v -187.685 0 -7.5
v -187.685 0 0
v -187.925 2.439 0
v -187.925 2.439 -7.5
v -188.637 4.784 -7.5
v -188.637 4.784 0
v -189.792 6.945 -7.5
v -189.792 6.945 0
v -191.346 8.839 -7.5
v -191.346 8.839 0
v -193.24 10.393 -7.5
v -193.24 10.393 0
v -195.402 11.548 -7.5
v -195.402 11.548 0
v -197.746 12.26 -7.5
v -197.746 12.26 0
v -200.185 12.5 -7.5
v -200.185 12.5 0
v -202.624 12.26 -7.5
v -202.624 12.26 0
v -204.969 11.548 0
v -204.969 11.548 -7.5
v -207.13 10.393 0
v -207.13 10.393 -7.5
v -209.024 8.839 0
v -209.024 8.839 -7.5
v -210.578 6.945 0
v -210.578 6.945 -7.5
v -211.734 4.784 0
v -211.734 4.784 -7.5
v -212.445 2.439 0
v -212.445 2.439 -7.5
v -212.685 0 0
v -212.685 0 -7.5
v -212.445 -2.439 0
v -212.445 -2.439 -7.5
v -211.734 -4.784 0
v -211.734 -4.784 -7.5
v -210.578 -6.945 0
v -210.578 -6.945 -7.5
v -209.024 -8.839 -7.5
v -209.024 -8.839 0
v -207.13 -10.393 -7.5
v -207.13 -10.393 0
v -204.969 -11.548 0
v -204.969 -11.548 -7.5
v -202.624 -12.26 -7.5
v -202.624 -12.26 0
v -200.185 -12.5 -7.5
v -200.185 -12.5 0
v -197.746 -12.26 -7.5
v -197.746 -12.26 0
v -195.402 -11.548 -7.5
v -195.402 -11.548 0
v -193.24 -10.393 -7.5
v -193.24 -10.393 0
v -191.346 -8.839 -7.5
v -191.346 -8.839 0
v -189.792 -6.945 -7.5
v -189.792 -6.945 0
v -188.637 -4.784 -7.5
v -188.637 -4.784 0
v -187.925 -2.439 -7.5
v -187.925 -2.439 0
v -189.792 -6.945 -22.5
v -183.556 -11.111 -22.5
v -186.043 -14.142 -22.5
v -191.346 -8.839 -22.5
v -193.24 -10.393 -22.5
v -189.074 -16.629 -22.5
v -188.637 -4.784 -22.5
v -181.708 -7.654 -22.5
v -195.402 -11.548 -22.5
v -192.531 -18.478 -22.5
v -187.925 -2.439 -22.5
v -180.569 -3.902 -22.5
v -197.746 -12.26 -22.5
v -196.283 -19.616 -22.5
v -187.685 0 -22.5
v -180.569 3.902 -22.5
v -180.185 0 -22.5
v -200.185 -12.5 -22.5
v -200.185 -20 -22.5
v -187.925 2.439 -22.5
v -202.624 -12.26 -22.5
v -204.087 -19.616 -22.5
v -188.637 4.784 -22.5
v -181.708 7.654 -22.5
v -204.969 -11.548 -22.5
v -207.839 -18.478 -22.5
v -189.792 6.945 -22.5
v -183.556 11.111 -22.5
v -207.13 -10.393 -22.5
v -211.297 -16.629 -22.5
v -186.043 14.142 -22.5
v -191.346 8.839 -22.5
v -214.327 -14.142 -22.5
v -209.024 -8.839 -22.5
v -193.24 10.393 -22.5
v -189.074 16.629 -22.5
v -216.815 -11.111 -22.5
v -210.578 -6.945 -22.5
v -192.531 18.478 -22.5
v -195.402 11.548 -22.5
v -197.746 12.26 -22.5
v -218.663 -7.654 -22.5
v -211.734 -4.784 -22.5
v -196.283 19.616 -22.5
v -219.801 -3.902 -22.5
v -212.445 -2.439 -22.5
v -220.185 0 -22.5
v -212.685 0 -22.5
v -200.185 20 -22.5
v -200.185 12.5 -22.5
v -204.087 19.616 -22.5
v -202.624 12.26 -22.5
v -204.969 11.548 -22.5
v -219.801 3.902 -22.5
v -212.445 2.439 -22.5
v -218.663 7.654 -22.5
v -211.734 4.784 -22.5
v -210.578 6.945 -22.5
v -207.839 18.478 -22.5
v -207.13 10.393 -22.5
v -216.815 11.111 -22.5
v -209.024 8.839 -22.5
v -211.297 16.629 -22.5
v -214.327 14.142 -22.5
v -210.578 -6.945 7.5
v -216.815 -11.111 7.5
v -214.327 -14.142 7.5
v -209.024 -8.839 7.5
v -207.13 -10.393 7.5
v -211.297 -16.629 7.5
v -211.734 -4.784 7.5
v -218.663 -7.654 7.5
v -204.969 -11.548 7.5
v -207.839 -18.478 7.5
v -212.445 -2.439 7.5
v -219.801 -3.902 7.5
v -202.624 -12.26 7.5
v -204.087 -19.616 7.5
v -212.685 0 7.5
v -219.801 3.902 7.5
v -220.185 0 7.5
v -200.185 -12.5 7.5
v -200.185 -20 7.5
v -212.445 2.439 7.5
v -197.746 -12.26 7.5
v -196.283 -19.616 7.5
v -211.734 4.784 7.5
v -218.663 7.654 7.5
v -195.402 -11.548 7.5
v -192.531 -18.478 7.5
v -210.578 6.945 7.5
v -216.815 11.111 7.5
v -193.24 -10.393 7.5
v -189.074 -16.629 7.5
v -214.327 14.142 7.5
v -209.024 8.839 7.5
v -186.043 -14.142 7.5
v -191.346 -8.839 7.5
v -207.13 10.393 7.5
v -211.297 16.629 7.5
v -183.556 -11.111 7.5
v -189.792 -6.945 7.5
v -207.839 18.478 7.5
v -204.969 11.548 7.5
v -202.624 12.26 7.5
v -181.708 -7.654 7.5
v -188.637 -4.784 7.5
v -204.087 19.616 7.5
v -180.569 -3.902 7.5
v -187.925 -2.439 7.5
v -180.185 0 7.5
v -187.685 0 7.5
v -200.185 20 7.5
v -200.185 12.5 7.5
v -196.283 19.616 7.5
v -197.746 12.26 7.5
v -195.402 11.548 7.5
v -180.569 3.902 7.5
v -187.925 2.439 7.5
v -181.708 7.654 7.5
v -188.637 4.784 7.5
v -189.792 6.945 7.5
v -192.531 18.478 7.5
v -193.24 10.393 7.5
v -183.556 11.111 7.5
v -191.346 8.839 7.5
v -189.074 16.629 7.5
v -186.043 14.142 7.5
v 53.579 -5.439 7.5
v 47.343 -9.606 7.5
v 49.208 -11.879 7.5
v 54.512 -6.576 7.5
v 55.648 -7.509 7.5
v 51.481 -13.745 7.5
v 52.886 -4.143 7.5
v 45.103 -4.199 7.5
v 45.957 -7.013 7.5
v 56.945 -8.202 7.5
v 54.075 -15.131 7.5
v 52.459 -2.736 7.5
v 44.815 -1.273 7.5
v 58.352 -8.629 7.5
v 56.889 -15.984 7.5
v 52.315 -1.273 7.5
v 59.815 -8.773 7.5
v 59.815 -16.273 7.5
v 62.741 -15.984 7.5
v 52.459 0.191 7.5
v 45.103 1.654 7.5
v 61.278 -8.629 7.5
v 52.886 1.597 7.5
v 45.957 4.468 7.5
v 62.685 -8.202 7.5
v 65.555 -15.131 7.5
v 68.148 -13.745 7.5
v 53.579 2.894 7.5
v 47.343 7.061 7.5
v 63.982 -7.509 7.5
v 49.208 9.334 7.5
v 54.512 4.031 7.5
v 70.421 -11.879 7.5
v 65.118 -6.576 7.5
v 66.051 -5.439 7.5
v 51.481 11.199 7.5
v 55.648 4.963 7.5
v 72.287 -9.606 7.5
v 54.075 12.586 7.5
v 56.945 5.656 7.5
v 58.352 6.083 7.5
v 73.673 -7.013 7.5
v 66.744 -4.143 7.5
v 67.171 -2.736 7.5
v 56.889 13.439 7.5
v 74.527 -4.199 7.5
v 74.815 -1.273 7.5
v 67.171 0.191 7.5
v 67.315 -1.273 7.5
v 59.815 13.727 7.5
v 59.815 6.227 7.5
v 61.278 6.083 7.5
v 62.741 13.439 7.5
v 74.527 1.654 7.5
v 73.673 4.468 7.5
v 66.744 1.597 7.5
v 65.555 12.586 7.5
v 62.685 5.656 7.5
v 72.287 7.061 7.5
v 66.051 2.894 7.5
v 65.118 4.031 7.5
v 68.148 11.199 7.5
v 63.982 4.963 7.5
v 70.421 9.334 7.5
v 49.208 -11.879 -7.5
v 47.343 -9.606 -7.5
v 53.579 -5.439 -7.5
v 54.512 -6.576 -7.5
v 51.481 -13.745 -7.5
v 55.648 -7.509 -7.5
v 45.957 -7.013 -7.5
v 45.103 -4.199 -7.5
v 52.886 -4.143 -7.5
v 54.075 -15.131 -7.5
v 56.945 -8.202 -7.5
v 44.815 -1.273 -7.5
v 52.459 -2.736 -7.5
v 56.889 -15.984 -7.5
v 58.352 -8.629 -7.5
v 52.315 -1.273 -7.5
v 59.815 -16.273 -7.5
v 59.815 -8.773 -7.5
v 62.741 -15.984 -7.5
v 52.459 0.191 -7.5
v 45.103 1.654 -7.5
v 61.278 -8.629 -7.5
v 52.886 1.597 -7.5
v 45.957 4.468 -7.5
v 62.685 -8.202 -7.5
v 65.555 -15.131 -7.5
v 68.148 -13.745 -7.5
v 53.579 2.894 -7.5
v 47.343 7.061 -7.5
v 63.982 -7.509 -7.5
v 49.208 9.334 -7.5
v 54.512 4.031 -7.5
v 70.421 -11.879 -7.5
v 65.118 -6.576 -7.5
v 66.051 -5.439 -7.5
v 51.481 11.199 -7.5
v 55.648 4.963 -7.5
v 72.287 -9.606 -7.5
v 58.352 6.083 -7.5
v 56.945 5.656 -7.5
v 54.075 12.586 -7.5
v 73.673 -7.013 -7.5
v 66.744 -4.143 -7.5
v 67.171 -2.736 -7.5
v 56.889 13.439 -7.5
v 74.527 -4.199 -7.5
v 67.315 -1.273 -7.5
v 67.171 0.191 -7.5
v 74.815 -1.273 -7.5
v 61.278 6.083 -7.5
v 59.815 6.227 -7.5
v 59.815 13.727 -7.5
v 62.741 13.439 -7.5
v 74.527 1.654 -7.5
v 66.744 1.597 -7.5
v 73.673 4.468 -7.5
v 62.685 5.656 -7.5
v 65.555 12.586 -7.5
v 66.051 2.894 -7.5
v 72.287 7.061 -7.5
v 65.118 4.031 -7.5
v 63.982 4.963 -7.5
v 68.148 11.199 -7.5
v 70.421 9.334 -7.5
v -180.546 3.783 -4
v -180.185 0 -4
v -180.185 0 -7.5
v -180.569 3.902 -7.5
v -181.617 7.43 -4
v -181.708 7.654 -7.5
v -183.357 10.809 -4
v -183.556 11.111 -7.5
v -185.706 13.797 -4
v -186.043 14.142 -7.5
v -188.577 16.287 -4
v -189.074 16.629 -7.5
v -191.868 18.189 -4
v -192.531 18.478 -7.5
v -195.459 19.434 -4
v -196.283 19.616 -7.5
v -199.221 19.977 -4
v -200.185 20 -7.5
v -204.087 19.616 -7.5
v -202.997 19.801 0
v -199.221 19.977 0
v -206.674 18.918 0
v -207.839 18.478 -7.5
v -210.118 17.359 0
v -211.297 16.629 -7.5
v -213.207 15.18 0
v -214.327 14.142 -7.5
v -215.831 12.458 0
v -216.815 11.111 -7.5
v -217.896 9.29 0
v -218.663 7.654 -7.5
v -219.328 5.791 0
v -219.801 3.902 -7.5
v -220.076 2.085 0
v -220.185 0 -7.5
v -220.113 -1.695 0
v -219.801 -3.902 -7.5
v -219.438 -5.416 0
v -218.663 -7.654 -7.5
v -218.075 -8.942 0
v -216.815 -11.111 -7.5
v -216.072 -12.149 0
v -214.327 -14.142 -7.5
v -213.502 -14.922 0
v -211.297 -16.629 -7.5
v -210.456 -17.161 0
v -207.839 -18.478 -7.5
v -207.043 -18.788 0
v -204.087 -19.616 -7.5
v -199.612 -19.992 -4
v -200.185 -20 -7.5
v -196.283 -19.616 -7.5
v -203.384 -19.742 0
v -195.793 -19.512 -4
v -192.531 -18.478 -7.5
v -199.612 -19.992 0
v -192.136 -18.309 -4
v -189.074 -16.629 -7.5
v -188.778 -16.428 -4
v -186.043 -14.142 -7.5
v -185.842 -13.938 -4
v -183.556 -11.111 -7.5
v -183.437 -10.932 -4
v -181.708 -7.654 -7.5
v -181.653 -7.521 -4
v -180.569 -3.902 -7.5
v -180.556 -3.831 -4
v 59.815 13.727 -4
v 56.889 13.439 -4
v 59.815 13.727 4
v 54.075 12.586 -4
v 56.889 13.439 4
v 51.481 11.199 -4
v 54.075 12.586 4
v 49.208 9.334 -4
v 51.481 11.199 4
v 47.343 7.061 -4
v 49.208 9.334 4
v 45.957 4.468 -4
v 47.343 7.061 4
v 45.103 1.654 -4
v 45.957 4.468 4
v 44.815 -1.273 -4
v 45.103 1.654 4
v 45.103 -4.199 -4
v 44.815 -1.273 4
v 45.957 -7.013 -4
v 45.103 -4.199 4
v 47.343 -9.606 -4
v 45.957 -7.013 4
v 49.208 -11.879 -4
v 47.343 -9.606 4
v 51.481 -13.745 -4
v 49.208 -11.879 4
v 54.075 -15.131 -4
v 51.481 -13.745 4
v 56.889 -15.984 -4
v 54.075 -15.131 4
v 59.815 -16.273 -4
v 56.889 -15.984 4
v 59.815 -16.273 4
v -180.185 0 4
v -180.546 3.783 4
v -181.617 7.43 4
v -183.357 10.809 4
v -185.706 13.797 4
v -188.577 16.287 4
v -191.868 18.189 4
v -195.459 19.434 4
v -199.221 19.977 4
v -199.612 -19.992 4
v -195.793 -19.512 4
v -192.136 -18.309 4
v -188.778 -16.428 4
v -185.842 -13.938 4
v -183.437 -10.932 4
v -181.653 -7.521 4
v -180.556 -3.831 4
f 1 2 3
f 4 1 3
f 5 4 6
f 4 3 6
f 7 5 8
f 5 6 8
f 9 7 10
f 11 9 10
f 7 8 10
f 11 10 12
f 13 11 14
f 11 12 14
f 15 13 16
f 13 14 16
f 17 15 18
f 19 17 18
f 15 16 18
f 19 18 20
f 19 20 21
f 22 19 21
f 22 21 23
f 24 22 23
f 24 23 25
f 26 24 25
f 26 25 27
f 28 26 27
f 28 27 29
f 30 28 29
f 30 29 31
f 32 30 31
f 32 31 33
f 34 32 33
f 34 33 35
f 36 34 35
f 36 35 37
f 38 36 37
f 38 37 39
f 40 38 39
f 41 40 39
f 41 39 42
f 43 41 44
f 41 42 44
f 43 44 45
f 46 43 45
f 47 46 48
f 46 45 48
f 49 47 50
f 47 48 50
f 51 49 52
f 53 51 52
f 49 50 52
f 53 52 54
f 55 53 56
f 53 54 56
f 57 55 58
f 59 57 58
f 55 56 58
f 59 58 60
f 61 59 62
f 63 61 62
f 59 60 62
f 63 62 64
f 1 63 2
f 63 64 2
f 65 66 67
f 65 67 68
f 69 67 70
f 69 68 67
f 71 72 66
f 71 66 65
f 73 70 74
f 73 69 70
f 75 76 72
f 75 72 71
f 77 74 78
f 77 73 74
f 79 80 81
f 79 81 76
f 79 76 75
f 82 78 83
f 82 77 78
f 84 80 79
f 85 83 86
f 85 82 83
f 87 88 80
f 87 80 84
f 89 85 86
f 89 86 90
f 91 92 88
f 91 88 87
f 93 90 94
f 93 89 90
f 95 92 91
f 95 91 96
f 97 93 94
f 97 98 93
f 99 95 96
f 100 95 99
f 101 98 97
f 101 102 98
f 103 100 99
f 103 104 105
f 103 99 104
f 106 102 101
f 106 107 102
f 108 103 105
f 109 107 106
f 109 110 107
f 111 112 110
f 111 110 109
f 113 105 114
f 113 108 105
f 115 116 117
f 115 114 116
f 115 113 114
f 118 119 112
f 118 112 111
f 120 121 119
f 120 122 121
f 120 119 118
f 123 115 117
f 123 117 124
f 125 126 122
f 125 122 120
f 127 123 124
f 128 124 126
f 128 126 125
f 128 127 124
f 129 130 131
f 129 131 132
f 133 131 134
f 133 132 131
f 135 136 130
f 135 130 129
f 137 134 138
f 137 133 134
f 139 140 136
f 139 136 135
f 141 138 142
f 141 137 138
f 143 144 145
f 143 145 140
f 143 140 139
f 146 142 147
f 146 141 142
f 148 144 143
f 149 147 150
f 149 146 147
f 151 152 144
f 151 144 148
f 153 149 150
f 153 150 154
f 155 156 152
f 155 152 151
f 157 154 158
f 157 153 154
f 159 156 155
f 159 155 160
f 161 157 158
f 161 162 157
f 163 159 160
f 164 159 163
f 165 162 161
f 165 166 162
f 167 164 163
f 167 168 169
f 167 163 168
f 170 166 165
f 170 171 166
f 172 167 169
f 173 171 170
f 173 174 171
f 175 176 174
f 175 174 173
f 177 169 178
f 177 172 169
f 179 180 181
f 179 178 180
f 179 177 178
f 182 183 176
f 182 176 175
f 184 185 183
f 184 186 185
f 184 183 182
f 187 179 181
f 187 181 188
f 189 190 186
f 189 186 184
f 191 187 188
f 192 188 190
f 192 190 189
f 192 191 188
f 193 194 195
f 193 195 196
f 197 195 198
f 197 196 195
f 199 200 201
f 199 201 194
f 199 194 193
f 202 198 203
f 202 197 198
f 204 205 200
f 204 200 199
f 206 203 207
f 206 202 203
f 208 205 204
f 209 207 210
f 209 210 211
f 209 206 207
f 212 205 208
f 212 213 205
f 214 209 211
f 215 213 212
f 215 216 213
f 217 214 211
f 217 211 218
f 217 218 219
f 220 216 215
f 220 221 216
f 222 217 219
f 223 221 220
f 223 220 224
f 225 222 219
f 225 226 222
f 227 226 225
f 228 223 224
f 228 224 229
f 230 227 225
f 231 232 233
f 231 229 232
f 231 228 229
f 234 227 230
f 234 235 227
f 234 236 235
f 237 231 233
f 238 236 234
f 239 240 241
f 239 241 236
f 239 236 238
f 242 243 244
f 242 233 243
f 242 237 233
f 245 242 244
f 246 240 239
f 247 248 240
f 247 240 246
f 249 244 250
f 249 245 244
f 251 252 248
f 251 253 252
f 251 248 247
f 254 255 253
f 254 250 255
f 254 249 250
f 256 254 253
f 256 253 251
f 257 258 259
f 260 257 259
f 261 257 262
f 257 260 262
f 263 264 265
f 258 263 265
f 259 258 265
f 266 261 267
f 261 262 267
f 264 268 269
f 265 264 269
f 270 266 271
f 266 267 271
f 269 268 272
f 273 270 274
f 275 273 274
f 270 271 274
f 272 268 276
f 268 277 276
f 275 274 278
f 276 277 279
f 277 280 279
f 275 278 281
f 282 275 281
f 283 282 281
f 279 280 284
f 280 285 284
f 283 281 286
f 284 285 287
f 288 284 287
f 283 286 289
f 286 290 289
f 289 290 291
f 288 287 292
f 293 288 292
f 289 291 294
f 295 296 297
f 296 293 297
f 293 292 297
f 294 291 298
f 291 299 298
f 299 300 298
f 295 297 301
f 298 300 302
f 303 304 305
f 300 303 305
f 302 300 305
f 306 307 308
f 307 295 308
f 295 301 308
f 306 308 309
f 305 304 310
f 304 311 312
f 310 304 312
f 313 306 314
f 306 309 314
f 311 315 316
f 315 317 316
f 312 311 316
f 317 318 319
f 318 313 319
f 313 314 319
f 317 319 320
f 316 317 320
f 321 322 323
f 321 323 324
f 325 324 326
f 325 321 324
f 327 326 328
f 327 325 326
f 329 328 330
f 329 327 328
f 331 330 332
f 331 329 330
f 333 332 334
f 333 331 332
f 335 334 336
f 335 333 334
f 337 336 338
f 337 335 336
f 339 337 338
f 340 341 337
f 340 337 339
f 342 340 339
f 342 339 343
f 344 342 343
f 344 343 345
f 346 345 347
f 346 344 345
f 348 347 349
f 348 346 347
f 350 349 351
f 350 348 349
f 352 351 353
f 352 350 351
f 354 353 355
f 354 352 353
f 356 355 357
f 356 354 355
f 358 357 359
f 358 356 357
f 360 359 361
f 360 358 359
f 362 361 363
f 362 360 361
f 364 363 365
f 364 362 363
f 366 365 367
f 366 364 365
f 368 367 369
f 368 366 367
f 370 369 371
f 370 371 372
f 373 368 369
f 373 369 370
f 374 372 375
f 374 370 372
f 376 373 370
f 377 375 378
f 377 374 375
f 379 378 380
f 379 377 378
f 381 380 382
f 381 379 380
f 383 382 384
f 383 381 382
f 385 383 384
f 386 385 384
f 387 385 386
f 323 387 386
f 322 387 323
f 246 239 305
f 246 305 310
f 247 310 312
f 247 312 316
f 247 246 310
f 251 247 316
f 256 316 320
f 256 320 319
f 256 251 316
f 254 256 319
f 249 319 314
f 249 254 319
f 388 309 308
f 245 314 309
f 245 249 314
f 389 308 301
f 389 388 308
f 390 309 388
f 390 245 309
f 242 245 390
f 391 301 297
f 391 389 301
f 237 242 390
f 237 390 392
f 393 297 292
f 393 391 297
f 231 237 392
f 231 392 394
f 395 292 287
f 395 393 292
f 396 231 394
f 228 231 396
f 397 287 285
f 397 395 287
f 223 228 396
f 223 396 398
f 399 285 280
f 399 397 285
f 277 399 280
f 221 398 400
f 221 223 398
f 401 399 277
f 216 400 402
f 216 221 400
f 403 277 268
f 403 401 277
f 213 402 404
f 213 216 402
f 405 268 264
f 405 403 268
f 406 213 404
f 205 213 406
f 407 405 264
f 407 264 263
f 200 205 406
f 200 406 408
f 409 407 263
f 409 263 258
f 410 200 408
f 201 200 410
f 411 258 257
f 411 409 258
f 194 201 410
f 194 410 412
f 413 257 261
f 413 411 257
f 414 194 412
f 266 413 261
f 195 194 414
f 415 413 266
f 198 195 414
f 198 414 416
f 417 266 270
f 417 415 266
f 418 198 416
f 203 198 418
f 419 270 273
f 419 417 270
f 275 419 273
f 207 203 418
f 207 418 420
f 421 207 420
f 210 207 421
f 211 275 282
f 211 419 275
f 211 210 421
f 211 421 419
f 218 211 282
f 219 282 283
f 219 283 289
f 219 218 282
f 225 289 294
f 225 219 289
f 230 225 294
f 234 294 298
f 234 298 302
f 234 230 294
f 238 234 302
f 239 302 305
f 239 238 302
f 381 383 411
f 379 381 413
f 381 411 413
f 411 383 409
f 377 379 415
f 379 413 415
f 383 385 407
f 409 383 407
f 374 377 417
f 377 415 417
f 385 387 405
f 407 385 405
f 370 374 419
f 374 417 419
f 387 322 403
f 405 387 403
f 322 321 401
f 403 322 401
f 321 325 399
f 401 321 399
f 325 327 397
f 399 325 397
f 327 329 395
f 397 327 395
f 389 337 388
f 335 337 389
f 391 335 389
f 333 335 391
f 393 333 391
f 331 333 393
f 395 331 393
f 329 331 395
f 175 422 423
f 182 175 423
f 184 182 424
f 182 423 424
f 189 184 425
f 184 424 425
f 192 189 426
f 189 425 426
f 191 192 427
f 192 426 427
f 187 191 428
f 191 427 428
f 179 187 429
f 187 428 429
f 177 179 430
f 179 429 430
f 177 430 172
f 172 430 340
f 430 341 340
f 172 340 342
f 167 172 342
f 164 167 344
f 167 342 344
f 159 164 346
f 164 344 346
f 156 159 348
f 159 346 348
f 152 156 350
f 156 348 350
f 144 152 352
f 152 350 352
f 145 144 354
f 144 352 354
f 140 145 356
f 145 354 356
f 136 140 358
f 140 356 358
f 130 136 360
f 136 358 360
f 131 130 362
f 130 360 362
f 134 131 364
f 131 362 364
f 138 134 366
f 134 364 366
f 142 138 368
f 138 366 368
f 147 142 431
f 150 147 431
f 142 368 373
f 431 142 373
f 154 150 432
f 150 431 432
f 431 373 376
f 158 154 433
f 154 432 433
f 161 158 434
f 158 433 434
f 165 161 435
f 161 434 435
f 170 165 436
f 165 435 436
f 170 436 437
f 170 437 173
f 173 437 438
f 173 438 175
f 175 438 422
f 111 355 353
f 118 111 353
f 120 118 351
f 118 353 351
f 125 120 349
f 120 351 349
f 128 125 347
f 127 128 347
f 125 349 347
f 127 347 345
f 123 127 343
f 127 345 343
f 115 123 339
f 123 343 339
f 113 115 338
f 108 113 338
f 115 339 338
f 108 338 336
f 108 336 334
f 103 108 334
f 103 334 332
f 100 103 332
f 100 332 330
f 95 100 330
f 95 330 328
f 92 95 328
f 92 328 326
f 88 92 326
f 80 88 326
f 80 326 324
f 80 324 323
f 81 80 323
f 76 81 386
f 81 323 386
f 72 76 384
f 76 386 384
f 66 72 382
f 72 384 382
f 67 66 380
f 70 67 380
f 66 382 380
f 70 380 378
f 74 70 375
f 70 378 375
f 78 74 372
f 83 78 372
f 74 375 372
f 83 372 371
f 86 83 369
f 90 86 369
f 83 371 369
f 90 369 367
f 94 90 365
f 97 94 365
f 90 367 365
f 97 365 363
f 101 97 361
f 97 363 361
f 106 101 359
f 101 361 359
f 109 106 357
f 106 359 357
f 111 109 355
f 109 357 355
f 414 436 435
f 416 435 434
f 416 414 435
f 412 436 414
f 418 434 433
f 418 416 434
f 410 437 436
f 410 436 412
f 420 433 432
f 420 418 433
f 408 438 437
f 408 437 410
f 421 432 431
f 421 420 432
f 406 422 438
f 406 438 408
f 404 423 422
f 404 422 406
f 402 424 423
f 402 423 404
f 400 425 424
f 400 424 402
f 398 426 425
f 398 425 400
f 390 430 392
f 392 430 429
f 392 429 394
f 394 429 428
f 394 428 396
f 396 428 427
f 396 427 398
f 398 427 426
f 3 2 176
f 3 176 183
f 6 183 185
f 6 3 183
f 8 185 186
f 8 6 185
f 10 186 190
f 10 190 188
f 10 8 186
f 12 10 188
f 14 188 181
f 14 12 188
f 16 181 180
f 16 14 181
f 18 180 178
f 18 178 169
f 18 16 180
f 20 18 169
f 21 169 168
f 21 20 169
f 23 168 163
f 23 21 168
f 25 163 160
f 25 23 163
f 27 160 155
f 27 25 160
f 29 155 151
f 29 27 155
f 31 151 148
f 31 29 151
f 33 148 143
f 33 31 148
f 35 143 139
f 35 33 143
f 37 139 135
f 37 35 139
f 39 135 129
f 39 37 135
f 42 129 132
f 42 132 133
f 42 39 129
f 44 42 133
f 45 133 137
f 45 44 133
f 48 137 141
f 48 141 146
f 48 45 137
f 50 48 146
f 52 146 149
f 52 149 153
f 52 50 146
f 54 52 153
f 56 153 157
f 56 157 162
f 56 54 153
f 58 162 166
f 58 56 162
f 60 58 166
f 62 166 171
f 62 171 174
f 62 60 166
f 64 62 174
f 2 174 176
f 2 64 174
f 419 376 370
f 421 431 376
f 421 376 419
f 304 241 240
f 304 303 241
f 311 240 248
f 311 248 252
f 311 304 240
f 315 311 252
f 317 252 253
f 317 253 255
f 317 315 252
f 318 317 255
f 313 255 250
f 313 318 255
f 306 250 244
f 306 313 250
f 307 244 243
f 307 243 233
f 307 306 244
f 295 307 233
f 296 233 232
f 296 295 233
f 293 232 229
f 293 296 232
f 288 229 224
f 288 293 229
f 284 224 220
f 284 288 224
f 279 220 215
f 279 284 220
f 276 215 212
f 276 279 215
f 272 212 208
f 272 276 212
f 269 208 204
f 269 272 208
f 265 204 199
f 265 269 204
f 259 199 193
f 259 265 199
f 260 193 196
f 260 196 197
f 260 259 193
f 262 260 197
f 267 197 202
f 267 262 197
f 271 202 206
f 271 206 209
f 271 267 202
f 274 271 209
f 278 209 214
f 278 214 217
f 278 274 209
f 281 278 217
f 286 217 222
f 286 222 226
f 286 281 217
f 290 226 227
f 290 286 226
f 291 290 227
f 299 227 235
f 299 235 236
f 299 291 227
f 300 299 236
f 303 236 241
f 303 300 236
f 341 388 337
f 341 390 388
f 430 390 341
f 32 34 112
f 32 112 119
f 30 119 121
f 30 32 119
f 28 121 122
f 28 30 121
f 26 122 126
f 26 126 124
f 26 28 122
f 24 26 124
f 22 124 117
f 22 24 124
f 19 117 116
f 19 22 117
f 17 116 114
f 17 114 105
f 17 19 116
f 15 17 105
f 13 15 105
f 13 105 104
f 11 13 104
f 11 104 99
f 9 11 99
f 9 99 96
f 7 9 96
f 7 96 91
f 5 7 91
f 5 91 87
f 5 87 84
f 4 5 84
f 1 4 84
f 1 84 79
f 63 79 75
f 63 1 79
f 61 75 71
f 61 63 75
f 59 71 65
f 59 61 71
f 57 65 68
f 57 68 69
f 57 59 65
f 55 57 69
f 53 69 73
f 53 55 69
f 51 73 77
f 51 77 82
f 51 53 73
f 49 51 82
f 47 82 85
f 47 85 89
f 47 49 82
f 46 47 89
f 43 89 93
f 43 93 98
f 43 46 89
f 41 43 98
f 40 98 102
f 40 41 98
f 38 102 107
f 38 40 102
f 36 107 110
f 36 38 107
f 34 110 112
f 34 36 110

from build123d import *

# Parameters (mm, degrees)
BOSS_EXTRUDE1_DEPTH = 4
SKETCH2_R           = 20
SKETCH2_R_2         = 12.5
SKETCH2_R_3         = 15
SKETCH2_R_4         = 7.5
BOSS_EXTRUDE2_DEPTH = 7.5
SKETCH3_R           = 20
SKETCH3_R_2         = 12.5
BOSS_EXTRUDE3_DEPTH = 15


with BuildPart() as part:
    # Sketch1 → Boss-Extrude1 (new, symmetric)
    with BuildSketch(Plane.XY):
        with BuildLine():
            Line((59.81488788, 13.727342811), (-199.220649297, 19.976731751))
            ThreePointArc((-199.220649297, 19.976731751), (-185.706002057, 13.796933419), (-180.18511212, 0))
            ThreePointArc((-180.18511212, 0), (-185.84170962, -13.937962718), (-199.611792592, -19.991780929))
            Line((-199.611792592, -19.991780929), (59.81488788, -16.272657189))
            ThreePointArc((59.81488788, -16.272657189), (44.81488788, -1.272657189), (59.81488788, 13.727342811))
        make_face()
    extrude(amount=BOSS_EXTRUDE1_DEPTH, both=True)

    # Sketch2 → Boss-Extrude2 (add, symmetric)
    # profile 1 of 2: a face of its own
    with BuildSketch(Plane.XY):
        with Locations((-200.18511212, 0)):
            Circle(SKETCH2_R)
        with Locations((-200.18511212, 0)):
            Circle(SKETCH2_R_2, mode=Mode.SUBTRACT)
    # profile 2 of 2: a face of its own
    with BuildSketch(Plane.XY):
        with Locations((59.81488788, -1.272657189)):
            Circle(SKETCH2_R_3)
        with Locations((59.81488788, -1.272657189)):
            Circle(SKETCH2_R_4, mode=Mode.SUBTRACT)
    extrude(amount=BOSS_EXTRUDE2_DEPTH, both=True)

    # Sketch3 → Boss-Extrude3 (add)
    with BuildSketch(Plane(origin=(0, 0, -7.5), x_dir=(-1, 0, 0), z_dir=(0, 0, -1))):
        with Locations((200.18511212, 0)):
            Circle(SKETCH3_R)
        with Locations((200.18511212, 0)):
            Circle(SKETCH3_R_2, mode=Mode.SUBTRACT)
    extrude(amount=BOSS_EXTRUDE3_DEPTH)


solid = part.part
